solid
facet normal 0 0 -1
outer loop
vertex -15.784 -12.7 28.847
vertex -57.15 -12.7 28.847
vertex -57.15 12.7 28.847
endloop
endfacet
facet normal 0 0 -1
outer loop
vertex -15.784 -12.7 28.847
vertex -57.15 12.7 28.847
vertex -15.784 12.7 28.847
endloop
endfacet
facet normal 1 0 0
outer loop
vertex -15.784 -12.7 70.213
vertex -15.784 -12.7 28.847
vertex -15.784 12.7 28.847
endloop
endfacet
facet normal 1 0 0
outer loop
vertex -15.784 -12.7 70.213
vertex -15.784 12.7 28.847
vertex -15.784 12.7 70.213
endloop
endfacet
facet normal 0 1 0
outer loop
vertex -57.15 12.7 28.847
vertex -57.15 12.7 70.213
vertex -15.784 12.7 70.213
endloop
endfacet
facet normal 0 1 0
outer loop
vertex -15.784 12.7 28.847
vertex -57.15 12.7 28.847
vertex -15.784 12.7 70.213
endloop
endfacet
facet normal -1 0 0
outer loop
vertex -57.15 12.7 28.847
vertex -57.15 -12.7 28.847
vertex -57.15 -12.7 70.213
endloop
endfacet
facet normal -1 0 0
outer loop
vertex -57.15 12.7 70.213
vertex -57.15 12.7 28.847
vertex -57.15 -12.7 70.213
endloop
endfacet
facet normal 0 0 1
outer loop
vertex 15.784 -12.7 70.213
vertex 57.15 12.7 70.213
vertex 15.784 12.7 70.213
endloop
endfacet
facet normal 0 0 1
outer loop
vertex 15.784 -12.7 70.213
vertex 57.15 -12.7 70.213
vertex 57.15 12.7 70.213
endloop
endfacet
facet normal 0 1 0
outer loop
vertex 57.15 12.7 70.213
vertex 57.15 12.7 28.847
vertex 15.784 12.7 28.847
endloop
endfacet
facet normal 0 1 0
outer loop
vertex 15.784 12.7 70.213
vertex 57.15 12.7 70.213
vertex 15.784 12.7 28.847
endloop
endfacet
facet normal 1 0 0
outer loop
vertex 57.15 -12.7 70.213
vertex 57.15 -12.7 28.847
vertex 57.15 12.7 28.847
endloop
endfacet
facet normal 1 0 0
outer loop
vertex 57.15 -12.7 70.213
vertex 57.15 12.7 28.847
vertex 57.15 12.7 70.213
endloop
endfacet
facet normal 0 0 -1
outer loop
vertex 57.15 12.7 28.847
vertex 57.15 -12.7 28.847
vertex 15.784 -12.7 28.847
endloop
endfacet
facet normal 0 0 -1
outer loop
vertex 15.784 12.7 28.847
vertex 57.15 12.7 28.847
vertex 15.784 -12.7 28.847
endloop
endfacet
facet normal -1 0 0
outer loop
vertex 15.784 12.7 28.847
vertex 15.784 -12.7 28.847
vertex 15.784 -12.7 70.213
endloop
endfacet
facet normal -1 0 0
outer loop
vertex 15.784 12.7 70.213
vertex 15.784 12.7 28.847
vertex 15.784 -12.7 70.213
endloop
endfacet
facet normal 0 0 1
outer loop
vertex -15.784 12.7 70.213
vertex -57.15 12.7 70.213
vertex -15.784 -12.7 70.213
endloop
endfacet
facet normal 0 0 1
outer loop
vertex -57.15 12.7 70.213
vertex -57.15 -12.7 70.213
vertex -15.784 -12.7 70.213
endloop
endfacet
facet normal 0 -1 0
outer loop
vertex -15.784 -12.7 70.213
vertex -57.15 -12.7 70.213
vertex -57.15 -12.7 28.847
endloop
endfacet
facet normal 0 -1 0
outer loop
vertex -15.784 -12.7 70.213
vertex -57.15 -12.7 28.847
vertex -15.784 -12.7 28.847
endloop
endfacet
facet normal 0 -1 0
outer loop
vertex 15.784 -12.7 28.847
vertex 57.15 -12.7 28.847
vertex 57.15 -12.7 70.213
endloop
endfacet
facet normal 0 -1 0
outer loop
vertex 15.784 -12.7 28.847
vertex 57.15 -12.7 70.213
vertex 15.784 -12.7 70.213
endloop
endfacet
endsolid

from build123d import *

# Parameters (mm, degrees)
F0_W     = 41.365713
F0_H     = 41.36572
F1_DEPTH = 12.7


with BuildPart() as f1:
    # F0 (on Front) → F1 (new body, symmetric)
    with BuildSketch(Plane.XZ):
        with Locations((-36.467142, 49.530003)):
            Rectangle(F0_W, F0_H)
    extrude(amount=F1_DEPTH, both=True)


with BuildPart() as f2_1:
    # F2: instance of F1
    add(f1.part.mirror(Plane.YZ))


solid = Compound([f1.part, f2_1.part])
